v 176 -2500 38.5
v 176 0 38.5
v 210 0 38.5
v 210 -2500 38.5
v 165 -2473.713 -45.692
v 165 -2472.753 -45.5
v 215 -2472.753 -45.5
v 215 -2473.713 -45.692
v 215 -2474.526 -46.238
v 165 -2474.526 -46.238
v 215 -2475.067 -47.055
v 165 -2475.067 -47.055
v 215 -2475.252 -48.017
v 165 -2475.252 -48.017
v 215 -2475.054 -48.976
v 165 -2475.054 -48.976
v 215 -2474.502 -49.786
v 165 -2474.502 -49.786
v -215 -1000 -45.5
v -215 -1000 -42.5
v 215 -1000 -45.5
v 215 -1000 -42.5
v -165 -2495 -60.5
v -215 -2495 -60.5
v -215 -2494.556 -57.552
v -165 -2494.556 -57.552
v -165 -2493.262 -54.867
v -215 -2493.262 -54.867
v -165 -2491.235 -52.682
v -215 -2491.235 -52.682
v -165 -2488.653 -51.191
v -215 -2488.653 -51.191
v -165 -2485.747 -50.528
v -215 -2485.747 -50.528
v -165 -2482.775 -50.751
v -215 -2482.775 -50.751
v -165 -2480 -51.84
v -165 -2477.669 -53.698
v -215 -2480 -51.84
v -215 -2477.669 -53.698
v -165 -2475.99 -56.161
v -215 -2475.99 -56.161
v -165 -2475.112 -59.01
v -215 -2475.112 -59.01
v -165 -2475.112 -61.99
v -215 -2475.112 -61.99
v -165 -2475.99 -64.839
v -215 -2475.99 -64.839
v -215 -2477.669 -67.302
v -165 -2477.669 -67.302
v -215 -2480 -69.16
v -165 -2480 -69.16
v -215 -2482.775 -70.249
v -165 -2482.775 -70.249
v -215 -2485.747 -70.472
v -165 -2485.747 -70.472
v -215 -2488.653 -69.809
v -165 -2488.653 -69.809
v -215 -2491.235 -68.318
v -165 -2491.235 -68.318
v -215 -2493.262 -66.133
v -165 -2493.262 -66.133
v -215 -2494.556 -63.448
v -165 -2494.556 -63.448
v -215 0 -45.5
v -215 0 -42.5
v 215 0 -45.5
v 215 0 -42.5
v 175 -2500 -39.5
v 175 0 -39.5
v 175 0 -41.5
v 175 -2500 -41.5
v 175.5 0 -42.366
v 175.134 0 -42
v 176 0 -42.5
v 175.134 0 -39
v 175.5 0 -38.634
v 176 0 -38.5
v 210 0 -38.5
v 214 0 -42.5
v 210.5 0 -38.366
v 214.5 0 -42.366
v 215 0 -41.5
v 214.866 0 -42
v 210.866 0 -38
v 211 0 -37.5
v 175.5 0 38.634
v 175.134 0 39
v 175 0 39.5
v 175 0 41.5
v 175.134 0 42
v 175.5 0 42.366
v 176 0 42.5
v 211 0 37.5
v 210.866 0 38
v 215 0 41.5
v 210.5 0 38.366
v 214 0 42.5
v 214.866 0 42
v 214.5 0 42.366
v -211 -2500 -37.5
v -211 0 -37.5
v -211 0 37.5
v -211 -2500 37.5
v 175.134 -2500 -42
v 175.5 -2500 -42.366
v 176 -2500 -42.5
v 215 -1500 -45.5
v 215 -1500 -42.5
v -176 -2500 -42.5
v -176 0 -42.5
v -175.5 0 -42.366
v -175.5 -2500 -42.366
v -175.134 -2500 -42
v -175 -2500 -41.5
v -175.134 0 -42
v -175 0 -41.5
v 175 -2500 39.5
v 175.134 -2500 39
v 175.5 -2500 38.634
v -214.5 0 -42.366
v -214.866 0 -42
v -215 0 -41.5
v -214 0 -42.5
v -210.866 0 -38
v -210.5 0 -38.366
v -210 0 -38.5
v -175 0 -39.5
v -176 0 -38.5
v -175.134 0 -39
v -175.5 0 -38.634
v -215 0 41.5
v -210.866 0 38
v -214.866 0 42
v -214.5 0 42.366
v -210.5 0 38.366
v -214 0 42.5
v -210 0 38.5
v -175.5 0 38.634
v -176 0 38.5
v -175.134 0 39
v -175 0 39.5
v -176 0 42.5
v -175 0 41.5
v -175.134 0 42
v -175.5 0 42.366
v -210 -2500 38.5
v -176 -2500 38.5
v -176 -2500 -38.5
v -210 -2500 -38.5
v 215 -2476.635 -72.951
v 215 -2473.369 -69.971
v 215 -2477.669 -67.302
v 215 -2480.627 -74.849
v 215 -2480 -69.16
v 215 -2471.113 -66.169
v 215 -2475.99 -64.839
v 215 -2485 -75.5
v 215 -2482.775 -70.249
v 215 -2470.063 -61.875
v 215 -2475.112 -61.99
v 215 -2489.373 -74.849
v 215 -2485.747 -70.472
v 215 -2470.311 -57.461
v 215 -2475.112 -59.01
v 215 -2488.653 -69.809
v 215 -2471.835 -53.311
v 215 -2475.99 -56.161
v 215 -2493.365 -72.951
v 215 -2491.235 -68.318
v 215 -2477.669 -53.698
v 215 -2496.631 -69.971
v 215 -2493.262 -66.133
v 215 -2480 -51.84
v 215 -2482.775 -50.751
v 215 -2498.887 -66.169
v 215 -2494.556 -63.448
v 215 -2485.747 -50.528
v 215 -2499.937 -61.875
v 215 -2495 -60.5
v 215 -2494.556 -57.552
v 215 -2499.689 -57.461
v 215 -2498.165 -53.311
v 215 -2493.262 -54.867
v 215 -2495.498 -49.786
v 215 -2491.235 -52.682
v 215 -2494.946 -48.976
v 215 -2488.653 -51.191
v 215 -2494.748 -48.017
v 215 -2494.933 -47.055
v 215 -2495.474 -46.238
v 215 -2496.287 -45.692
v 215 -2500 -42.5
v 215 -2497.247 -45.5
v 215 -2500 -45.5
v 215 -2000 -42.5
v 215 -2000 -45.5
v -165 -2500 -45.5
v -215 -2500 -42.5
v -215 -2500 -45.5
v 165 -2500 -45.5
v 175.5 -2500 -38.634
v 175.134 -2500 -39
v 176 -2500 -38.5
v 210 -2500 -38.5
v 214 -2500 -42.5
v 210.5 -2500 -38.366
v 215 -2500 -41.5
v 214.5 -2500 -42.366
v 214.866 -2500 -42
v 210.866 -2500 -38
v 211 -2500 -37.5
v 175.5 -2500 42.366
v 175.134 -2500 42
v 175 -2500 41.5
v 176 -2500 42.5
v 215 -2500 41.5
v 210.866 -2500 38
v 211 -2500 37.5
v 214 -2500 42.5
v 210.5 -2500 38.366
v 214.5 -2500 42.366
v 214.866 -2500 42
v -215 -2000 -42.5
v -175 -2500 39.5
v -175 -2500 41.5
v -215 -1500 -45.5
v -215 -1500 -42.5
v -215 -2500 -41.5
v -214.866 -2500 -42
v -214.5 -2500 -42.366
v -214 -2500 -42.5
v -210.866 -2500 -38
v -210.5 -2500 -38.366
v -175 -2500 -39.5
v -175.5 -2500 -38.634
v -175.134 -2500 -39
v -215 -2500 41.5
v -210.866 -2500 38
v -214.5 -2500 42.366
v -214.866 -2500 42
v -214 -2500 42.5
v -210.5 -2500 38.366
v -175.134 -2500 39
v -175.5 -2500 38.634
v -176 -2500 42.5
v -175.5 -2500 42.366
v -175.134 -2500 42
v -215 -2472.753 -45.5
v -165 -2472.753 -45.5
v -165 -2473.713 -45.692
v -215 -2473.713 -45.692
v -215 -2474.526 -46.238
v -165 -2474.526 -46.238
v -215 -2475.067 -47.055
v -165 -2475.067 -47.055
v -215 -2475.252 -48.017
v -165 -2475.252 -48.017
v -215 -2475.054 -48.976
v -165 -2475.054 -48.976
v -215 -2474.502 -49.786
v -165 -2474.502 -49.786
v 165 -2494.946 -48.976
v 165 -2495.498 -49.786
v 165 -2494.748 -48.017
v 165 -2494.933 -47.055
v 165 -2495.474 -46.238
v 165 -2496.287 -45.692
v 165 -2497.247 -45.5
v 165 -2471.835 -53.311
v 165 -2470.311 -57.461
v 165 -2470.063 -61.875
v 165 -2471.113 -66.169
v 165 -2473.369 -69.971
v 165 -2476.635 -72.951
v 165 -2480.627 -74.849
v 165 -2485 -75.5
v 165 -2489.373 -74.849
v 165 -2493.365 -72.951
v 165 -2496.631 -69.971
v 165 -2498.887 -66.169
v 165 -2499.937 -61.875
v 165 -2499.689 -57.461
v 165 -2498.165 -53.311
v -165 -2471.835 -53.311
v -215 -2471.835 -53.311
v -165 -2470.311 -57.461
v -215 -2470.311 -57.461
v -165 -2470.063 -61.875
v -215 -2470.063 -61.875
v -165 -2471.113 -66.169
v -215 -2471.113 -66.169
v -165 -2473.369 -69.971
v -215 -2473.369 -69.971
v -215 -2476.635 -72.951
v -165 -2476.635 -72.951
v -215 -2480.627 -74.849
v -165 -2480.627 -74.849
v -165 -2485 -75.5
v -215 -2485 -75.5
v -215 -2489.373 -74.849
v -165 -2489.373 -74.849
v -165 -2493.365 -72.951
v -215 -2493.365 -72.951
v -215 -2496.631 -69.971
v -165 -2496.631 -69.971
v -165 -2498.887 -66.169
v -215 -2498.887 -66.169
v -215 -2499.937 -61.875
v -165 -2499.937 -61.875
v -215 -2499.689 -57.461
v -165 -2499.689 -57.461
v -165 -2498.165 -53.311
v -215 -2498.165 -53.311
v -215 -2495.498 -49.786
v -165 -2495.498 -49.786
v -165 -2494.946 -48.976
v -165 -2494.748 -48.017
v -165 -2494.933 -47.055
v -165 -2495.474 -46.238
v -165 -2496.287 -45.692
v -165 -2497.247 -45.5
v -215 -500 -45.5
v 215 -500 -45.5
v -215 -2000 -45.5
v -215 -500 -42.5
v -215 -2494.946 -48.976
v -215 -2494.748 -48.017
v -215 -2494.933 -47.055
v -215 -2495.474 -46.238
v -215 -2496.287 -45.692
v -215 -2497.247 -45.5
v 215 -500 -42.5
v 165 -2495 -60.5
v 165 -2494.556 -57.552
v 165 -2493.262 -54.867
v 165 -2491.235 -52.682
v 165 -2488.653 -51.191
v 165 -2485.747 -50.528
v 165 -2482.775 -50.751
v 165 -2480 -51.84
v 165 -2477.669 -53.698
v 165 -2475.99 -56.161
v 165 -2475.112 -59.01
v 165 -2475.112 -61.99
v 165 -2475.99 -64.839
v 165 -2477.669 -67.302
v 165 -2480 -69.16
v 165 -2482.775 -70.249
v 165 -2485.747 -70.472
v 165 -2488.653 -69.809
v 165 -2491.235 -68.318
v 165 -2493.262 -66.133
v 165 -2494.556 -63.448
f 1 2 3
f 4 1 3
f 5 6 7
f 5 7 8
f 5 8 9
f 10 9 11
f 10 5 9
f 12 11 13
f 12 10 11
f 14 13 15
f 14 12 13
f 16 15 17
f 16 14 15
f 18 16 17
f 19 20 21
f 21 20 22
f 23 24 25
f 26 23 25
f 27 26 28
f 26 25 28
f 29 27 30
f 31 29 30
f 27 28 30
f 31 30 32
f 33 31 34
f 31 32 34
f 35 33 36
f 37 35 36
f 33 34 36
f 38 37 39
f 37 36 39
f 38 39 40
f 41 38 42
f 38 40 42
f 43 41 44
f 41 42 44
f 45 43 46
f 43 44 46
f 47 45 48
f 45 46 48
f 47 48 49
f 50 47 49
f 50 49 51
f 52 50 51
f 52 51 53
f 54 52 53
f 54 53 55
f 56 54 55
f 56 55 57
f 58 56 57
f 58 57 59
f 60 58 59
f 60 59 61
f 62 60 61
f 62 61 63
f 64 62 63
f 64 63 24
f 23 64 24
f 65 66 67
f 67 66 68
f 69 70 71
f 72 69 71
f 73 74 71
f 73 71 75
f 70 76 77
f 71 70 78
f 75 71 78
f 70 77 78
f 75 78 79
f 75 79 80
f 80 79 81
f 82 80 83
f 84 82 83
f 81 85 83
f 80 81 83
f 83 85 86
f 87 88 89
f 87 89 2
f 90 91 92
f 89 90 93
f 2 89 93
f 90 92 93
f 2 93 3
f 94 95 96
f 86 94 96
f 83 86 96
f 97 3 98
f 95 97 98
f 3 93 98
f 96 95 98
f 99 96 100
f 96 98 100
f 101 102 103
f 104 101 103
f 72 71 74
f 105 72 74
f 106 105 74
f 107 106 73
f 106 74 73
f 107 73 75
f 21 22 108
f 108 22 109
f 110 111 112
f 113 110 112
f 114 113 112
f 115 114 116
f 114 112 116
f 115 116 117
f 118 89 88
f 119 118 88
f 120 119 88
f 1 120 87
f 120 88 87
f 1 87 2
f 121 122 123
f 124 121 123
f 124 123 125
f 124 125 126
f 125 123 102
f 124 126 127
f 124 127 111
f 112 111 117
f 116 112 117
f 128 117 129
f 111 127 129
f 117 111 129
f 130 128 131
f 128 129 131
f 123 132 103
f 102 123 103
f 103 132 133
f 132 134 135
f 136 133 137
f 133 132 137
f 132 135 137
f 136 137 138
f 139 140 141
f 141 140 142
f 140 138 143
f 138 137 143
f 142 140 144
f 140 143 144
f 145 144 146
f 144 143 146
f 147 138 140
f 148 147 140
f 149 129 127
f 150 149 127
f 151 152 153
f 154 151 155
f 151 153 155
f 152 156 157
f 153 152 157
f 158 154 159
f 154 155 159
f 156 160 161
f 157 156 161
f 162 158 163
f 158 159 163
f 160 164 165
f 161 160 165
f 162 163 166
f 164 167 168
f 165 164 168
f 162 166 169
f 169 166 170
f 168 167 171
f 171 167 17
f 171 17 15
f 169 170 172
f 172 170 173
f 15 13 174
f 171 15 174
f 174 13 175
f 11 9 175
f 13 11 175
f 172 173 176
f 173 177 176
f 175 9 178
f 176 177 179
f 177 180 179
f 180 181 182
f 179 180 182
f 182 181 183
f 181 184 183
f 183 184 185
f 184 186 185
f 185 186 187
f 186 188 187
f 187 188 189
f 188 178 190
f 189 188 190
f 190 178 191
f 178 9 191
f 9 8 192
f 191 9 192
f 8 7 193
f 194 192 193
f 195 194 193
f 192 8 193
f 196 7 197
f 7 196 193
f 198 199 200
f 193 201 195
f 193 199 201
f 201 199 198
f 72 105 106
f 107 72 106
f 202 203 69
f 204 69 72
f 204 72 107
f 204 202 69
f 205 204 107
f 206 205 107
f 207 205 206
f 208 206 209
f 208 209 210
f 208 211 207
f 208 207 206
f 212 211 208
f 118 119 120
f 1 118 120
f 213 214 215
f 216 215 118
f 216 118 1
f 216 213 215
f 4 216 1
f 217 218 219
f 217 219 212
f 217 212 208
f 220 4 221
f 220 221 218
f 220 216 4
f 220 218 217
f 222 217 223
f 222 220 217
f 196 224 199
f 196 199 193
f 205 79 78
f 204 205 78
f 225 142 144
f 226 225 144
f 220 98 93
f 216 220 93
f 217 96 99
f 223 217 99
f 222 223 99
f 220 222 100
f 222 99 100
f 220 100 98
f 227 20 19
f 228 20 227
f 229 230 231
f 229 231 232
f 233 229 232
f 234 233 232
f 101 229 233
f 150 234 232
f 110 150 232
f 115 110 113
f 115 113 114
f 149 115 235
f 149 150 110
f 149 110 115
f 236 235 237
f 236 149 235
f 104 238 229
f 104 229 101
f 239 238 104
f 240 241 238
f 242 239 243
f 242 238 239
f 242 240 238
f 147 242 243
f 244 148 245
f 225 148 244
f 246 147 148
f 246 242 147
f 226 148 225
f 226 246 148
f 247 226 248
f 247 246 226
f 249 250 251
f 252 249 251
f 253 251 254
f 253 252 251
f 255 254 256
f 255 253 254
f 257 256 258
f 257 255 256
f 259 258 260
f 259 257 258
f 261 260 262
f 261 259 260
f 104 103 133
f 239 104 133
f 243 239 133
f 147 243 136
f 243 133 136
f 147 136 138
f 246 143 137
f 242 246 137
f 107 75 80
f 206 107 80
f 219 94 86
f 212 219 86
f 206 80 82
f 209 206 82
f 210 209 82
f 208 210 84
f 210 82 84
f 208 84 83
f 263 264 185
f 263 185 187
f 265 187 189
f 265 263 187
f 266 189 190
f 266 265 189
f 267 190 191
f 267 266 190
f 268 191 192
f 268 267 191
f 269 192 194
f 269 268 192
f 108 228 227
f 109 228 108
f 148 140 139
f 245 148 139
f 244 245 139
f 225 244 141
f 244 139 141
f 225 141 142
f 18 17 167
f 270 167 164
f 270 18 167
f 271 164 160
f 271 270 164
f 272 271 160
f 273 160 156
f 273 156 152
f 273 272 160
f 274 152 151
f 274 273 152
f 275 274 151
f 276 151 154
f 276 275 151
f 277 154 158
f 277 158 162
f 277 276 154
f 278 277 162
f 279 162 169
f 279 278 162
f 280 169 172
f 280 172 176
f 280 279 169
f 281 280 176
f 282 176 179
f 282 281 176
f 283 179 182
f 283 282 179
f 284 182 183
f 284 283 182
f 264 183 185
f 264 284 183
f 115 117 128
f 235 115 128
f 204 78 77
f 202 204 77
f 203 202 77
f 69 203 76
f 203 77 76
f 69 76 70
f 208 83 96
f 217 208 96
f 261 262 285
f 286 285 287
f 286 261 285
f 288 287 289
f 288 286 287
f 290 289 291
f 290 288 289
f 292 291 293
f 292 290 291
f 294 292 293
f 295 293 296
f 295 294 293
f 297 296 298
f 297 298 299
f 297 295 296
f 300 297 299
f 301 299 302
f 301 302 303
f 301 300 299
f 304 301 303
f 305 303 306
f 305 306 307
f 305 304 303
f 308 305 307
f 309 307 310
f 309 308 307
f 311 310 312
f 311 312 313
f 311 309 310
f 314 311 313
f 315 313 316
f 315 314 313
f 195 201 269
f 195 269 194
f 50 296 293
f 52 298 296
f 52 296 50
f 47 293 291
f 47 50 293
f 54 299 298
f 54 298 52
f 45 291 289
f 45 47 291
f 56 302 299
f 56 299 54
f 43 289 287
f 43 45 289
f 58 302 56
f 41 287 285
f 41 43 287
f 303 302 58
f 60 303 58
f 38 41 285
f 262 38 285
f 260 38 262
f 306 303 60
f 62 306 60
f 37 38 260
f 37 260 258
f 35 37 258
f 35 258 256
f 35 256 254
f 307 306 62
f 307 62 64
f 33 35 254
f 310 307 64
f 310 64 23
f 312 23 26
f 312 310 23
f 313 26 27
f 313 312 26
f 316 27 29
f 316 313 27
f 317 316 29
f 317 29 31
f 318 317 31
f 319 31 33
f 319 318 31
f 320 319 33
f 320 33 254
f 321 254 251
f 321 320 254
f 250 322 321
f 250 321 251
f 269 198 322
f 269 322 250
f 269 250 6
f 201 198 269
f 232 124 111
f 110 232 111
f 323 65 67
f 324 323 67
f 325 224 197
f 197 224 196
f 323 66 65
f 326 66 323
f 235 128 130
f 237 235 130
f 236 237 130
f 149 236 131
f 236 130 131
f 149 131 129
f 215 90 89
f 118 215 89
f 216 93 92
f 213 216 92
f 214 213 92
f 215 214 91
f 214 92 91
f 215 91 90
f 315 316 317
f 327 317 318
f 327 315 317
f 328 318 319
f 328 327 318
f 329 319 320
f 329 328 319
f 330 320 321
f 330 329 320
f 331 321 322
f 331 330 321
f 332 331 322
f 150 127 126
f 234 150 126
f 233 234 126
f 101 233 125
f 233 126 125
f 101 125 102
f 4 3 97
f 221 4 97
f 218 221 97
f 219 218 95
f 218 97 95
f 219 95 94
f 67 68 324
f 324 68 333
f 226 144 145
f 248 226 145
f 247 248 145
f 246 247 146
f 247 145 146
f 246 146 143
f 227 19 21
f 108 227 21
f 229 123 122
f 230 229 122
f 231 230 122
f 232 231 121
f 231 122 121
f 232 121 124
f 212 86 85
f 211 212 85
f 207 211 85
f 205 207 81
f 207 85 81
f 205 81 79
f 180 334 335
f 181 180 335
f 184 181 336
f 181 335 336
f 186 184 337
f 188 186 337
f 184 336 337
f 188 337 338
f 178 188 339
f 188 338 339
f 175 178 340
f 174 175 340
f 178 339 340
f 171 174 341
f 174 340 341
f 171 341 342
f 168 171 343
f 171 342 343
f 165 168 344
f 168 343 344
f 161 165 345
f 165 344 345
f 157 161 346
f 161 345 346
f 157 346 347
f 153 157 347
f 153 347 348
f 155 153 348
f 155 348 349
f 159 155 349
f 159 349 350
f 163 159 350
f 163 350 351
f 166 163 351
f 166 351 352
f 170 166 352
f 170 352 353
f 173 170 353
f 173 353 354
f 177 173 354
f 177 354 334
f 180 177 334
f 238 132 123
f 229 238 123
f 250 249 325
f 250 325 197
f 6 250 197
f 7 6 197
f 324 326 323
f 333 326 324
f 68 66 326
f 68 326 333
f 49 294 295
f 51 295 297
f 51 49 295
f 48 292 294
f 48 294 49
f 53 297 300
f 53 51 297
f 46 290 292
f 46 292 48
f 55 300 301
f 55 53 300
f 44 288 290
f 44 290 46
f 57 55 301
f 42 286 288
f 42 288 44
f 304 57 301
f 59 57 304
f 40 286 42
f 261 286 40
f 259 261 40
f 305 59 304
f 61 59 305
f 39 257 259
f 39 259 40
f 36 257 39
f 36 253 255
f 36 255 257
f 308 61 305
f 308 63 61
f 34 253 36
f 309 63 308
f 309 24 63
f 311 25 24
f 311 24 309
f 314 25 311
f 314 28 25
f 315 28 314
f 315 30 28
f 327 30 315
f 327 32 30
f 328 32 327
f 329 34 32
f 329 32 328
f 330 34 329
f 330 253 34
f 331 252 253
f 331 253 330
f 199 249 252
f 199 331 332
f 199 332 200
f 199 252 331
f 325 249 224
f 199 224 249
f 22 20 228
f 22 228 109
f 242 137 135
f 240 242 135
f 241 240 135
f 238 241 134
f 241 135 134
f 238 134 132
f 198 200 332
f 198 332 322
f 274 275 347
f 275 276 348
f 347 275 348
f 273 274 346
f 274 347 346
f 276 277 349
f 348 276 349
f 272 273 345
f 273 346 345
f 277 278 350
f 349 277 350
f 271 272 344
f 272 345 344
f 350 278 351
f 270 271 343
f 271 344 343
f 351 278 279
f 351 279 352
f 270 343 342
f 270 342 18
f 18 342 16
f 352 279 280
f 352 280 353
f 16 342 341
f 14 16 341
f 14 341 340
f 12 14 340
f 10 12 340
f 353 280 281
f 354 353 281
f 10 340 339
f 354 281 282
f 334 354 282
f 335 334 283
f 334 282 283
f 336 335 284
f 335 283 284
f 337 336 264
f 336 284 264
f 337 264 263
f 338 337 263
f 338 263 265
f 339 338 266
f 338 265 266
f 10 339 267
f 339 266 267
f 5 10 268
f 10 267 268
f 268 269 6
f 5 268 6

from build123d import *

# Parameters (mm, degrees)
F1_DEPTH = 2500
F2_W     = 430
F2_H     = 500
F3_DEPTH = 3
F4_R     = 10
F5_DEPTH = 430
F6_W     = 330
F6_H     = 35.722197
F7_DEPTH = 49


with BuildPart() as f1:
    # F0 (on Front) → F1 (new body)
    with BuildSketch(Plane.XZ):
        with BuildLine():
            ThreePointArc((-175, 41.5), (-175.292893, 42.207107), (-176, 42.5))
            Line((-176, 42.5), (-214, 42.5))
            ThreePointArc((-214, 42.5), (-214.707107, 42.207107), (-215, 41.5))
            Line((-215, 41.5), (-215, -41.5))
            ThreePointArc((-215, -41.5), (-214.707107, -42.207107), (-214, -42.5))
            Line((-214, -42.5), (-176, -42.5))
            ThreePointArc((-176, -42.5), (-175.292893, -42.207107), (-175, -41.5))
            Line((-175, -41.5), (-175, -39.5))
            ThreePointArc((-175, -39.5), (-175.292893, -38.792893), (-176, -38.5))
            Line((-176, -38.5), (-210, -38.5))
            ThreePointArc((-210, -38.5), (-210.707107, -38.207107), (-211, -37.5))
            Line((-211, -37.5), (-211, 37.5))
            ThreePointArc((-211, 37.5), (-210.707107, 38.207107), (-210, 38.5))
            Line((-210, 38.5), (-176, 38.5))
            ThreePointArc((-176, 38.5), (-175.292893, 38.792893), (-175, 39.5))
            Line((-175, 39.5), (-175, 41.5))
        make_face()
        with BuildLine():
            ThreePointArc((175, -41.5), (175.292893, -42.207107), (176, -42.5))
            Line((176, -42.5), (214, -42.5))
            ThreePointArc((214, -42.5), (214.707107, -42.207107), (215, -41.5))
            Line((215, -41.5), (215, 41.5))
            ThreePointArc((215, 41.5), (214.707107, 42.207107), (214, 42.5))
            Line((214, 42.5), (176, 42.5))
            ThreePointArc((176, 42.5), (175.292893, 42.207107), (175, 41.5))
            Line((175, 41.5), (175, 39.5))
            ThreePointArc((175, 39.5), (175.292893, 38.792893), (176, 38.5))
            Line((176, 38.5), (210, 38.5))
            ThreePointArc((210, 38.5), (210.707107, 38.207107), (211, 37.5))
            Line((211, 37.5), (211, -37.5))
            ThreePointArc((211, -37.5), (210.707107, -38.207107), (210, -38.5))
            Line((210, -38.5), (176, -38.5))
            ThreePointArc((176, -38.5), (175.292893, -38.792893), (175, -39.5))
            Line((175, -39.5), (175, -41.5))
        make_face()
    extrude(amount=F1_DEPTH)


with BuildPart() as f3:
    # F2 (on face) → F3 (new body)
    with BuildSketch(Plane(origin=(0, 0, -42.5), x_dir=(1, 0, 0), z_dir=(0, 0, -1))):
        with Locations((0, 2250)):
            Rectangle(F2_W, F2_H)
        with Locations((0, 1250)):
            Rectangle(F2_W, F2_H)
        with Locations((0, 250)):
            Rectangle(F2_W, F2_H)
    extrude(amount=F3_DEPTH)

    # F4 (on face) → F5 (join, through all)
    with BuildSketch(Plane(origin=(-215, 0, 0), x_dir=(0, -1, 0), z_dir=(-1, 0, 0))):
        with BuildLine():
            ThreePointArc((2472.752551, -45.5), (2475.067102, -47.055089), (2474.502187, -49.785714))
            ThreePointArc((2474.502187, -49.785714), (2485, -75.5), (2495.497813, -49.785714))
            ThreePointArc((2495.497813, -49.785714), (2494.932898, -47.055089), (2497.247449, -45.5))
            Line((2497.247449, -45.5), (2472.752551, -45.5))
        make_face()
        with Locations((2485, -60.5)):
            Circle(F4_R, mode=Mode.SUBTRACT)
    extrude(amount=-F5_DEPTH)

    # F6 (on face) → F7 (cut)
    with BuildSketch(Plane.XZ.offset(2500)):
        with Locations((0, -63.361098)):
            Rectangle(F6_W, F6_H)
    extrude(amount=-F7_DEPTH, mode=Mode.SUBTRACT)


solid = Compound([f1.part, f3.part])
